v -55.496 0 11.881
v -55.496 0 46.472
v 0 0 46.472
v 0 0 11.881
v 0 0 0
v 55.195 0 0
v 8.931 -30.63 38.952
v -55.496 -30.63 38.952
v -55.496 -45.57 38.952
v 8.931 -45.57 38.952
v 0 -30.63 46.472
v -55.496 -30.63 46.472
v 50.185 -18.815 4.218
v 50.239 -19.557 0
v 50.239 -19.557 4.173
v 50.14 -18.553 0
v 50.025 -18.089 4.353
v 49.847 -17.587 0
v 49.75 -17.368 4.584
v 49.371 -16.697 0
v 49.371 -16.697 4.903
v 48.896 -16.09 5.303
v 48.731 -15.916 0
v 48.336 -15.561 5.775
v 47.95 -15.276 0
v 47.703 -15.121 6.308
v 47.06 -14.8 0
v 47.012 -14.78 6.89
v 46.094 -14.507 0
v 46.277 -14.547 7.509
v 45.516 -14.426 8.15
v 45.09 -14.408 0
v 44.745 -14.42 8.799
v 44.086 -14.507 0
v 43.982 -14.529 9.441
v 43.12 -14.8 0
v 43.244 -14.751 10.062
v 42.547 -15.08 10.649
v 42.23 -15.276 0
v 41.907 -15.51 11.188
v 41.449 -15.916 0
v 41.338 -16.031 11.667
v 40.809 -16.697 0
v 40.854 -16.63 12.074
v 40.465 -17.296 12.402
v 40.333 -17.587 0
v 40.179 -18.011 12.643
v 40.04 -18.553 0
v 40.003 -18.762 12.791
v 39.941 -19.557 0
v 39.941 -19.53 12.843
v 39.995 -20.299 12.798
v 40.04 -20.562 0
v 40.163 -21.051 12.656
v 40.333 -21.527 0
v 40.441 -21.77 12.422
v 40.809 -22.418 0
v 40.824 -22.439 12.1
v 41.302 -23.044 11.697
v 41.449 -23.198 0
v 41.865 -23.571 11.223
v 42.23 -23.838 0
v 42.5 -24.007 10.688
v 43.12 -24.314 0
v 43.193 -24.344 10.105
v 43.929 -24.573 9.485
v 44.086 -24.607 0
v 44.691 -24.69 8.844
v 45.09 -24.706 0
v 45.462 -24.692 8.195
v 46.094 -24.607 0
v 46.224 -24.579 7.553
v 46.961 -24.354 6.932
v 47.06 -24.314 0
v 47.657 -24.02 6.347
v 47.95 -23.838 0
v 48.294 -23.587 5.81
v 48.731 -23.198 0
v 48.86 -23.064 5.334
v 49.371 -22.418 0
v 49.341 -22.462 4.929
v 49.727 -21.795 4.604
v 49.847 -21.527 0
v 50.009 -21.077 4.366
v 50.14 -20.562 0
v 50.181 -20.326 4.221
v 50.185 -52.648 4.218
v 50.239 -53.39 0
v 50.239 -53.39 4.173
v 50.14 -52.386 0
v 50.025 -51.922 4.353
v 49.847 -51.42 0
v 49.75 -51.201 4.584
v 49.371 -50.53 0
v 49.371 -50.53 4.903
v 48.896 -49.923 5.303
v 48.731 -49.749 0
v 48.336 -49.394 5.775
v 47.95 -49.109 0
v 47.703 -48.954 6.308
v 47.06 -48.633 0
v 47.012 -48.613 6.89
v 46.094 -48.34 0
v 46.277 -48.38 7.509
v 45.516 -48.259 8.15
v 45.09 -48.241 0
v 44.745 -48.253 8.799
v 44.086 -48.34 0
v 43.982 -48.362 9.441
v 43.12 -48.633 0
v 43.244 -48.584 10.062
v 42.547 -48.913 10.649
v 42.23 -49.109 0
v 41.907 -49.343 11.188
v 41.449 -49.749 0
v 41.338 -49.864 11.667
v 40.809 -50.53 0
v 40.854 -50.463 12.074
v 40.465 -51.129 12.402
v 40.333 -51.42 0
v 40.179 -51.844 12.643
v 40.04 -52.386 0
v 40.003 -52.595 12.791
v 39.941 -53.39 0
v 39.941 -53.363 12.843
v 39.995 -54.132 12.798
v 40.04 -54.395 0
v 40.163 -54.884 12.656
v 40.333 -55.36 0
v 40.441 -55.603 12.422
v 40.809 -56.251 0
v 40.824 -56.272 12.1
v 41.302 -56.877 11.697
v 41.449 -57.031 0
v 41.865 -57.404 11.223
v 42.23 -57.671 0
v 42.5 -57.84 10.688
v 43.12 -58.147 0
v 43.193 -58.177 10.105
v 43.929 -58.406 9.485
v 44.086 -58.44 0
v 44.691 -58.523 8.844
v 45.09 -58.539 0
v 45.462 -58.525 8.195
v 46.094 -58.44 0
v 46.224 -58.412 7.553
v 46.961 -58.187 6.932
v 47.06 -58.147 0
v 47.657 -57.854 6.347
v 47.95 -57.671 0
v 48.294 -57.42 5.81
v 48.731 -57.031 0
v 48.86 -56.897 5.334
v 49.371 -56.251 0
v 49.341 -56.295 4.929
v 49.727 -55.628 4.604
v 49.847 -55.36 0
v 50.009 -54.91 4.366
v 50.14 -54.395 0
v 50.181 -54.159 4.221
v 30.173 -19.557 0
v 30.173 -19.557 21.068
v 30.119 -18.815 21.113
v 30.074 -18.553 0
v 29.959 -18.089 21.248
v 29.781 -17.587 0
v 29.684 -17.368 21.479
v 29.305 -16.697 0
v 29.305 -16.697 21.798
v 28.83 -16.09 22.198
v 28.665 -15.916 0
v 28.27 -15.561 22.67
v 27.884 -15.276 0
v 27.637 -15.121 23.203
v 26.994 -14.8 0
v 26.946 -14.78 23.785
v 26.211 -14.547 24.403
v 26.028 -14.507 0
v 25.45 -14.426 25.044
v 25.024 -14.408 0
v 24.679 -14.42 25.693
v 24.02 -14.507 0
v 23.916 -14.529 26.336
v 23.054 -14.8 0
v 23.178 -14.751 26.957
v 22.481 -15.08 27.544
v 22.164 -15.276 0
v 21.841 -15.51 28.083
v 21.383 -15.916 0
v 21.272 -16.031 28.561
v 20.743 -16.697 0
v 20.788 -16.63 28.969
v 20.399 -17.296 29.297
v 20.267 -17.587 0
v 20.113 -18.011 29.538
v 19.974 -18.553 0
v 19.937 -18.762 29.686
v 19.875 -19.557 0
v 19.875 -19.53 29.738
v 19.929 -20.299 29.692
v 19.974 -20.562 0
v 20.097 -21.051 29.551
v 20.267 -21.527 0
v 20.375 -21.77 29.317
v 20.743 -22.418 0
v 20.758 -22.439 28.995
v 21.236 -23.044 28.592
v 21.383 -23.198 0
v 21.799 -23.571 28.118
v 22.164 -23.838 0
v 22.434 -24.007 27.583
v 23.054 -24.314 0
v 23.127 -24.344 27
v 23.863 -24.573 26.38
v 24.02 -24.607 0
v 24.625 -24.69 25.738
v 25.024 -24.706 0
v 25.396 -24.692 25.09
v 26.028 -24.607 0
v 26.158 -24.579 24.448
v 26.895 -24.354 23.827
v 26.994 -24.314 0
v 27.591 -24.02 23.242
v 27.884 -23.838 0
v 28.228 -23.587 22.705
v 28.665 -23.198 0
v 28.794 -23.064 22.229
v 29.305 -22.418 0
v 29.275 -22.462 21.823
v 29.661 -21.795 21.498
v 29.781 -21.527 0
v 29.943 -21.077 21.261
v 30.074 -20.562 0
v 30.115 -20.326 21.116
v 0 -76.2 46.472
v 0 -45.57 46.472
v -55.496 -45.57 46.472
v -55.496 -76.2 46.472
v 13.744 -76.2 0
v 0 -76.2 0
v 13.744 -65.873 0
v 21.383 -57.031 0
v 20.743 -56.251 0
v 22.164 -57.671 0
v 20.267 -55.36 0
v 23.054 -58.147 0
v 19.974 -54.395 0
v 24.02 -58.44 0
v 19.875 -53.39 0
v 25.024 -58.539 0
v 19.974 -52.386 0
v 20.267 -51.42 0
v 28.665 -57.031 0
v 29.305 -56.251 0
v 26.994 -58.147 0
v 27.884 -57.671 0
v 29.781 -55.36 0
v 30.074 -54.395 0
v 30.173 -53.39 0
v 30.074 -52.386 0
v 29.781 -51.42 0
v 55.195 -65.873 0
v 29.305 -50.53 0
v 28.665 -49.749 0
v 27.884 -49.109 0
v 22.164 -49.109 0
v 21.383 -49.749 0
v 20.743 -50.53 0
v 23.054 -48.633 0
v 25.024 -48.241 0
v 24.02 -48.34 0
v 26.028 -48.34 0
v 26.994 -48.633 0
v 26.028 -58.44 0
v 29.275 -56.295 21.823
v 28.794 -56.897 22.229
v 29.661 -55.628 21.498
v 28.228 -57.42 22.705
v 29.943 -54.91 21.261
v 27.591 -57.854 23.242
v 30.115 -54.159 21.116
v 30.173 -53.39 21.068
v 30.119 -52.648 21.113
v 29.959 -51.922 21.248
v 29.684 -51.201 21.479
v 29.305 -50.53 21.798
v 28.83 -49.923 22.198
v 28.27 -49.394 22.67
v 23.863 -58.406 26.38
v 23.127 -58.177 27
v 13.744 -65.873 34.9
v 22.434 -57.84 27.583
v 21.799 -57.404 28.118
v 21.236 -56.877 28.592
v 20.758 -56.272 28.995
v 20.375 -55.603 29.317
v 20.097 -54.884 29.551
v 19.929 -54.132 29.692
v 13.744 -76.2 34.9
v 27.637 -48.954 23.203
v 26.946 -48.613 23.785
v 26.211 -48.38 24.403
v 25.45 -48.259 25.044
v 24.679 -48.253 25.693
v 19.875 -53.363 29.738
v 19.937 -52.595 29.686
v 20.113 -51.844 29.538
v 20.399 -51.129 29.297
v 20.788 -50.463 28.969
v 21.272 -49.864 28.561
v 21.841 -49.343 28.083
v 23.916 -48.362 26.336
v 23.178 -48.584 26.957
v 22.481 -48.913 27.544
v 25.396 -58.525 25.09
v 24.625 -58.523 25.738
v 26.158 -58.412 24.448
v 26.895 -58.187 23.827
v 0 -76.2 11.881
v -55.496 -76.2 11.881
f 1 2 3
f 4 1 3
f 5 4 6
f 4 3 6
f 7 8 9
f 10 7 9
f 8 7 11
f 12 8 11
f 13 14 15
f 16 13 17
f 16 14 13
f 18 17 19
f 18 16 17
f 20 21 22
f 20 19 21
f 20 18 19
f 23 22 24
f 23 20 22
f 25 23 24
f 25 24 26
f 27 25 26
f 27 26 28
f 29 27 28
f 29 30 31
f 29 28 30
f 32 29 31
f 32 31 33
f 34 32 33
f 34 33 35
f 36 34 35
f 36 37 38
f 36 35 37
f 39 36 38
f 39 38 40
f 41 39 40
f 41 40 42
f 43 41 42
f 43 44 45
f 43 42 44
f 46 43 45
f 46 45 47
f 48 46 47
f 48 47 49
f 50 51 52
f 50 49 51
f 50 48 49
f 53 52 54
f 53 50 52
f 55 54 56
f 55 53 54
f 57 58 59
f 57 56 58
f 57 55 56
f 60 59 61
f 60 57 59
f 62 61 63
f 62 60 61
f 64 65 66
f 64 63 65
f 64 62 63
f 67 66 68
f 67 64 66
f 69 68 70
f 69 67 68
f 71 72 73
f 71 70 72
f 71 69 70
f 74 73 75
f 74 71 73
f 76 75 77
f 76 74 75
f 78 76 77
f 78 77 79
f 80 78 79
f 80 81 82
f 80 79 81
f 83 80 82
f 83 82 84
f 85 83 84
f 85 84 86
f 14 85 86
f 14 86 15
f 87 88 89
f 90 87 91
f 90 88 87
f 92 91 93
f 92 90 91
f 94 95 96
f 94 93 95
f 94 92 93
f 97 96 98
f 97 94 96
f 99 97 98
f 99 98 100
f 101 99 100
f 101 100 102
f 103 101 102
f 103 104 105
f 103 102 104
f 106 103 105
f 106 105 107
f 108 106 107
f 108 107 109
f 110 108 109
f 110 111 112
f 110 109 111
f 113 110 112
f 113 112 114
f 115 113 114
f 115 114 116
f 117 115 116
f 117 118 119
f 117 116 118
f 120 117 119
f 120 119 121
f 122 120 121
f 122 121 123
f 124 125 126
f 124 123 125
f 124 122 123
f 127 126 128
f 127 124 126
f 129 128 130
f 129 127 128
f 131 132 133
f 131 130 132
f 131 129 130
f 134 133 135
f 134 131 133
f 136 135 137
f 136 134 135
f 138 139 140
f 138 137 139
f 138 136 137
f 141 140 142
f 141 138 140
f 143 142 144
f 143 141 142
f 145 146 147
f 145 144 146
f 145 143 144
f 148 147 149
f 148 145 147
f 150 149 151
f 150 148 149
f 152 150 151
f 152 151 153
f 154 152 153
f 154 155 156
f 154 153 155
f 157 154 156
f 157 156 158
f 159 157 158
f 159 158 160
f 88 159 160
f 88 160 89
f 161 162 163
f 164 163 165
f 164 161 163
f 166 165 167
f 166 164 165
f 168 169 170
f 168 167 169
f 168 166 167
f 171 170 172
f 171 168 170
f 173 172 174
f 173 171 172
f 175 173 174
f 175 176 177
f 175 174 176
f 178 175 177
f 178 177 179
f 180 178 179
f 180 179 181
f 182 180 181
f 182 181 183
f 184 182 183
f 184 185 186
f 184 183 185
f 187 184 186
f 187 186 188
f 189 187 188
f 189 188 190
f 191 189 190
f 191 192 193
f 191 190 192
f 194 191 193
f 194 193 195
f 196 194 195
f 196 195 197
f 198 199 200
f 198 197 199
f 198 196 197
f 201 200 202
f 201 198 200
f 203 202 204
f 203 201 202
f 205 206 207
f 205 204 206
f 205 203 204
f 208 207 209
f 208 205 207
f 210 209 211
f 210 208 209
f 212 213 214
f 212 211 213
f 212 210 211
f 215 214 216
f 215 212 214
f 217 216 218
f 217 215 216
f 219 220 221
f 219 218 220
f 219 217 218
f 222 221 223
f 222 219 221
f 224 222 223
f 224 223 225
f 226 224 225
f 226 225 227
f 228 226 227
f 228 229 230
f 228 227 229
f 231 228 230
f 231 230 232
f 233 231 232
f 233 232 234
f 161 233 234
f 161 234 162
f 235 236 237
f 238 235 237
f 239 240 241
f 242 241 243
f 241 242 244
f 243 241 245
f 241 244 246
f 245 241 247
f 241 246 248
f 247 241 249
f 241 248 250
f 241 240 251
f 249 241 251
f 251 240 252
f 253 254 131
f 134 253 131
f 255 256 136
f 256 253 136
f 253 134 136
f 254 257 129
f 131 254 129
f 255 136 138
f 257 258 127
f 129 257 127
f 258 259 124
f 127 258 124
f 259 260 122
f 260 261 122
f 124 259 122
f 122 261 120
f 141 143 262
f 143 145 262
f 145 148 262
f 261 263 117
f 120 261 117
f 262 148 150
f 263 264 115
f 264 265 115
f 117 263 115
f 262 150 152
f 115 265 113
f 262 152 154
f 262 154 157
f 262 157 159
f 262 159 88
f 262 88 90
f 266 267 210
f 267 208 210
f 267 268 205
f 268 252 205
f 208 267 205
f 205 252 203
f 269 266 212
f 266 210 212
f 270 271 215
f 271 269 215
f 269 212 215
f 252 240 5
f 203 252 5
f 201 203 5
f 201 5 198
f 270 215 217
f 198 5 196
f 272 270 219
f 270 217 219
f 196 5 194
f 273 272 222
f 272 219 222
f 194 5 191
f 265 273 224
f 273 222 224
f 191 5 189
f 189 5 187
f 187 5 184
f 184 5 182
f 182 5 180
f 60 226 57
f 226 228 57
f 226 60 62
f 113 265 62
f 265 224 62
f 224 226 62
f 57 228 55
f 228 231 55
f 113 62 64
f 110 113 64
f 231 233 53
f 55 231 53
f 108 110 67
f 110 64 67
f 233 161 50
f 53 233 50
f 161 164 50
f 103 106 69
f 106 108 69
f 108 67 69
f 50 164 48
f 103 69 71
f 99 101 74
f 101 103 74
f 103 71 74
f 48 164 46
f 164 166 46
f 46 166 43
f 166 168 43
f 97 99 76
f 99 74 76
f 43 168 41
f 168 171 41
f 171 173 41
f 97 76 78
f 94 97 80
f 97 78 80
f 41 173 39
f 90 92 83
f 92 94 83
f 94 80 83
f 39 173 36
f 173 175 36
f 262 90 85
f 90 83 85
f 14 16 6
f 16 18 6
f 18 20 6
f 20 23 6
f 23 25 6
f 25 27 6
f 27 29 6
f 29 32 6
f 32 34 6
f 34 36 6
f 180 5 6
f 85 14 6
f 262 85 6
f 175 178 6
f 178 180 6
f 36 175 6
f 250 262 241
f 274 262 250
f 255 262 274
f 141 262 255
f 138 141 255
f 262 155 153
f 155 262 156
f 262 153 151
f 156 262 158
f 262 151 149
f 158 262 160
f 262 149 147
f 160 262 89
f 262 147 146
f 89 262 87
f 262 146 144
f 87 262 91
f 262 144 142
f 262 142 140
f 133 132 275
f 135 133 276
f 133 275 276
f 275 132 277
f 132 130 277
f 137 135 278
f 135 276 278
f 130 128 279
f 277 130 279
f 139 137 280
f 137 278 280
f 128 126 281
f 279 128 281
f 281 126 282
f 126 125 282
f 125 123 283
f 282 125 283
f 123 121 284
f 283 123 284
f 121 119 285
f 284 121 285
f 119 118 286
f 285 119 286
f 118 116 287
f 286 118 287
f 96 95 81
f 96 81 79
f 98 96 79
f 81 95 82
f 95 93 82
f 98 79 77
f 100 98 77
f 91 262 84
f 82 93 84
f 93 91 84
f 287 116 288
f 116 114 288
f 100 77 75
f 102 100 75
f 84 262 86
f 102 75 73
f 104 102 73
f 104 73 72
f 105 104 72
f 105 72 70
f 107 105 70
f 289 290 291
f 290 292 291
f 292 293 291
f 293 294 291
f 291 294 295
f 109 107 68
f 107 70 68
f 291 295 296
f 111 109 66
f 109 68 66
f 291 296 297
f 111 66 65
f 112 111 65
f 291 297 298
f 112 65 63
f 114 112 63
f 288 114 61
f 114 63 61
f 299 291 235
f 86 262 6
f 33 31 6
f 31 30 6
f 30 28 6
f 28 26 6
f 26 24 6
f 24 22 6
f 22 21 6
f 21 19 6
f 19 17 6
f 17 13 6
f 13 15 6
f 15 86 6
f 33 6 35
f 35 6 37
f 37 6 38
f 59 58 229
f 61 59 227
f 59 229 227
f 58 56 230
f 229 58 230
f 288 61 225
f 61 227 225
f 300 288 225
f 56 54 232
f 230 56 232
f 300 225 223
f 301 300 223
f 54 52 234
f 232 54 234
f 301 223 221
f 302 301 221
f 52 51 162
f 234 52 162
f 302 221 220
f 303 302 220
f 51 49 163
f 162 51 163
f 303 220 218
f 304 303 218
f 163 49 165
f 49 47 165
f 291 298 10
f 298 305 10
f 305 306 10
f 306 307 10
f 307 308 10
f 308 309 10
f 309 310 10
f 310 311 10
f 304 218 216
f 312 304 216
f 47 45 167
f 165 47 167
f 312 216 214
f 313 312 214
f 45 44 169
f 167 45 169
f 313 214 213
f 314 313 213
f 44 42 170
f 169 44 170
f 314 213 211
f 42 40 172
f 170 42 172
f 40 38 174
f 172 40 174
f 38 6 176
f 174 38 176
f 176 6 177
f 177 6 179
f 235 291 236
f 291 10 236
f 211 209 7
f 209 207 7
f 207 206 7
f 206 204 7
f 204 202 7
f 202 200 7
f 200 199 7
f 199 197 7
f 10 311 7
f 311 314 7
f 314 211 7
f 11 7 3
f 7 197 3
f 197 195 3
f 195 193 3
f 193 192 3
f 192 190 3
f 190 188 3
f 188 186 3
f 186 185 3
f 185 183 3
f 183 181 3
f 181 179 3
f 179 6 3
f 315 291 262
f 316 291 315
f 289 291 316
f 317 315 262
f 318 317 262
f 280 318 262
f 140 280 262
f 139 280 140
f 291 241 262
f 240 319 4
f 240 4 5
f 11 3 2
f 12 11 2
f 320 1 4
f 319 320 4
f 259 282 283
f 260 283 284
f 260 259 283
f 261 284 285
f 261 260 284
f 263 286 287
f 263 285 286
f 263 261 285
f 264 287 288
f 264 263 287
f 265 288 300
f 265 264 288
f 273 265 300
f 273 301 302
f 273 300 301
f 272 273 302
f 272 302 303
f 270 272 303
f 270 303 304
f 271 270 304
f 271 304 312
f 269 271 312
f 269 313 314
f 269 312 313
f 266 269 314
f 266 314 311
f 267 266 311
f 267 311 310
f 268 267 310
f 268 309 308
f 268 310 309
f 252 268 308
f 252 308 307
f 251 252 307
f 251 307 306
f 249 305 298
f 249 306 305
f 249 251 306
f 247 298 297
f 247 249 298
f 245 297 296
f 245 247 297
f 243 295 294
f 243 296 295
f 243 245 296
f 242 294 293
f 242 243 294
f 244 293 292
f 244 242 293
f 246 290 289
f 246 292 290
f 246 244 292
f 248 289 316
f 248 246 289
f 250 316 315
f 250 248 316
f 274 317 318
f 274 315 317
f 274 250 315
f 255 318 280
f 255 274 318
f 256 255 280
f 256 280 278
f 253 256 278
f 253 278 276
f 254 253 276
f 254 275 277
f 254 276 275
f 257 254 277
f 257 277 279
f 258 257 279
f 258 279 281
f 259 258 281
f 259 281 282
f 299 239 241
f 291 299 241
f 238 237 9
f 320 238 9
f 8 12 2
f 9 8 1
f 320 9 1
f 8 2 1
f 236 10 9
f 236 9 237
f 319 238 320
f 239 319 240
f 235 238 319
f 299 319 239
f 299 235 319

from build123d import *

# Parameters (mm, degrees)
F1_DEPTH = 76.2
F2_W     = 14.9392048001
F2_H     = 7.519736886
F3_DEPTH = 110.691522939
F4_W     = 41.4504492655
F4_H     = 10.3266900301
F4_R     = 5.148684062
F5_DEPTH = 188


# Not quite as in the source:
# - an extrude ends at something that could not be found from the text; its depth is read off the source's solid


with BuildPart() as f1:
    # F0 (on Front) → F1 (new body)
    with BuildSketch(Plane.XZ):
        Polygon((0, 11.8811847642), (0, 0), (55.1948659122, 0), (0, 46.4719720185), (-55.4956570268, 46.4719720185), (-55.4956570268, 11.8811847642), align=None)
    extrude(amount=F1_DEPTH)

    # F2 (on face) → F3 (cut, through all)
    with BuildSketch(Plane(origin=(-55.4956570268, 0, 0), x_dir=(0, -1, 0), z_dir=(-1, 0, 0))):
        with Locations((38.1, 42.7121035755)):
            Rectangle(F2_W, F2_H)
    extrude(amount=-F3_DEPTH, mode=Mode.SUBTRACT)

    # F4 (on Top) → F5 (cut, through all)
    with BuildSketch(Plane.XY):
        with Locations((34.4696412794, -71.036654985)):
            Rectangle(F4_W, F4_H)
        with Locations((45.0900119481, -53.3901341259)):
            Circle(F4_R)
        with Locations((45.0900119481, -19.5571203102)):
            Circle(F4_R)
        with Locations((25.0240119481, -53.3901341259)):
            Circle(F4_R)
        with Locations((25.0240119481, -19.5571203102)):
            Circle(F4_R)
    extrude(amount=F5_DEPTH, mode=Mode.SUBTRACT)


solid = f1.part
